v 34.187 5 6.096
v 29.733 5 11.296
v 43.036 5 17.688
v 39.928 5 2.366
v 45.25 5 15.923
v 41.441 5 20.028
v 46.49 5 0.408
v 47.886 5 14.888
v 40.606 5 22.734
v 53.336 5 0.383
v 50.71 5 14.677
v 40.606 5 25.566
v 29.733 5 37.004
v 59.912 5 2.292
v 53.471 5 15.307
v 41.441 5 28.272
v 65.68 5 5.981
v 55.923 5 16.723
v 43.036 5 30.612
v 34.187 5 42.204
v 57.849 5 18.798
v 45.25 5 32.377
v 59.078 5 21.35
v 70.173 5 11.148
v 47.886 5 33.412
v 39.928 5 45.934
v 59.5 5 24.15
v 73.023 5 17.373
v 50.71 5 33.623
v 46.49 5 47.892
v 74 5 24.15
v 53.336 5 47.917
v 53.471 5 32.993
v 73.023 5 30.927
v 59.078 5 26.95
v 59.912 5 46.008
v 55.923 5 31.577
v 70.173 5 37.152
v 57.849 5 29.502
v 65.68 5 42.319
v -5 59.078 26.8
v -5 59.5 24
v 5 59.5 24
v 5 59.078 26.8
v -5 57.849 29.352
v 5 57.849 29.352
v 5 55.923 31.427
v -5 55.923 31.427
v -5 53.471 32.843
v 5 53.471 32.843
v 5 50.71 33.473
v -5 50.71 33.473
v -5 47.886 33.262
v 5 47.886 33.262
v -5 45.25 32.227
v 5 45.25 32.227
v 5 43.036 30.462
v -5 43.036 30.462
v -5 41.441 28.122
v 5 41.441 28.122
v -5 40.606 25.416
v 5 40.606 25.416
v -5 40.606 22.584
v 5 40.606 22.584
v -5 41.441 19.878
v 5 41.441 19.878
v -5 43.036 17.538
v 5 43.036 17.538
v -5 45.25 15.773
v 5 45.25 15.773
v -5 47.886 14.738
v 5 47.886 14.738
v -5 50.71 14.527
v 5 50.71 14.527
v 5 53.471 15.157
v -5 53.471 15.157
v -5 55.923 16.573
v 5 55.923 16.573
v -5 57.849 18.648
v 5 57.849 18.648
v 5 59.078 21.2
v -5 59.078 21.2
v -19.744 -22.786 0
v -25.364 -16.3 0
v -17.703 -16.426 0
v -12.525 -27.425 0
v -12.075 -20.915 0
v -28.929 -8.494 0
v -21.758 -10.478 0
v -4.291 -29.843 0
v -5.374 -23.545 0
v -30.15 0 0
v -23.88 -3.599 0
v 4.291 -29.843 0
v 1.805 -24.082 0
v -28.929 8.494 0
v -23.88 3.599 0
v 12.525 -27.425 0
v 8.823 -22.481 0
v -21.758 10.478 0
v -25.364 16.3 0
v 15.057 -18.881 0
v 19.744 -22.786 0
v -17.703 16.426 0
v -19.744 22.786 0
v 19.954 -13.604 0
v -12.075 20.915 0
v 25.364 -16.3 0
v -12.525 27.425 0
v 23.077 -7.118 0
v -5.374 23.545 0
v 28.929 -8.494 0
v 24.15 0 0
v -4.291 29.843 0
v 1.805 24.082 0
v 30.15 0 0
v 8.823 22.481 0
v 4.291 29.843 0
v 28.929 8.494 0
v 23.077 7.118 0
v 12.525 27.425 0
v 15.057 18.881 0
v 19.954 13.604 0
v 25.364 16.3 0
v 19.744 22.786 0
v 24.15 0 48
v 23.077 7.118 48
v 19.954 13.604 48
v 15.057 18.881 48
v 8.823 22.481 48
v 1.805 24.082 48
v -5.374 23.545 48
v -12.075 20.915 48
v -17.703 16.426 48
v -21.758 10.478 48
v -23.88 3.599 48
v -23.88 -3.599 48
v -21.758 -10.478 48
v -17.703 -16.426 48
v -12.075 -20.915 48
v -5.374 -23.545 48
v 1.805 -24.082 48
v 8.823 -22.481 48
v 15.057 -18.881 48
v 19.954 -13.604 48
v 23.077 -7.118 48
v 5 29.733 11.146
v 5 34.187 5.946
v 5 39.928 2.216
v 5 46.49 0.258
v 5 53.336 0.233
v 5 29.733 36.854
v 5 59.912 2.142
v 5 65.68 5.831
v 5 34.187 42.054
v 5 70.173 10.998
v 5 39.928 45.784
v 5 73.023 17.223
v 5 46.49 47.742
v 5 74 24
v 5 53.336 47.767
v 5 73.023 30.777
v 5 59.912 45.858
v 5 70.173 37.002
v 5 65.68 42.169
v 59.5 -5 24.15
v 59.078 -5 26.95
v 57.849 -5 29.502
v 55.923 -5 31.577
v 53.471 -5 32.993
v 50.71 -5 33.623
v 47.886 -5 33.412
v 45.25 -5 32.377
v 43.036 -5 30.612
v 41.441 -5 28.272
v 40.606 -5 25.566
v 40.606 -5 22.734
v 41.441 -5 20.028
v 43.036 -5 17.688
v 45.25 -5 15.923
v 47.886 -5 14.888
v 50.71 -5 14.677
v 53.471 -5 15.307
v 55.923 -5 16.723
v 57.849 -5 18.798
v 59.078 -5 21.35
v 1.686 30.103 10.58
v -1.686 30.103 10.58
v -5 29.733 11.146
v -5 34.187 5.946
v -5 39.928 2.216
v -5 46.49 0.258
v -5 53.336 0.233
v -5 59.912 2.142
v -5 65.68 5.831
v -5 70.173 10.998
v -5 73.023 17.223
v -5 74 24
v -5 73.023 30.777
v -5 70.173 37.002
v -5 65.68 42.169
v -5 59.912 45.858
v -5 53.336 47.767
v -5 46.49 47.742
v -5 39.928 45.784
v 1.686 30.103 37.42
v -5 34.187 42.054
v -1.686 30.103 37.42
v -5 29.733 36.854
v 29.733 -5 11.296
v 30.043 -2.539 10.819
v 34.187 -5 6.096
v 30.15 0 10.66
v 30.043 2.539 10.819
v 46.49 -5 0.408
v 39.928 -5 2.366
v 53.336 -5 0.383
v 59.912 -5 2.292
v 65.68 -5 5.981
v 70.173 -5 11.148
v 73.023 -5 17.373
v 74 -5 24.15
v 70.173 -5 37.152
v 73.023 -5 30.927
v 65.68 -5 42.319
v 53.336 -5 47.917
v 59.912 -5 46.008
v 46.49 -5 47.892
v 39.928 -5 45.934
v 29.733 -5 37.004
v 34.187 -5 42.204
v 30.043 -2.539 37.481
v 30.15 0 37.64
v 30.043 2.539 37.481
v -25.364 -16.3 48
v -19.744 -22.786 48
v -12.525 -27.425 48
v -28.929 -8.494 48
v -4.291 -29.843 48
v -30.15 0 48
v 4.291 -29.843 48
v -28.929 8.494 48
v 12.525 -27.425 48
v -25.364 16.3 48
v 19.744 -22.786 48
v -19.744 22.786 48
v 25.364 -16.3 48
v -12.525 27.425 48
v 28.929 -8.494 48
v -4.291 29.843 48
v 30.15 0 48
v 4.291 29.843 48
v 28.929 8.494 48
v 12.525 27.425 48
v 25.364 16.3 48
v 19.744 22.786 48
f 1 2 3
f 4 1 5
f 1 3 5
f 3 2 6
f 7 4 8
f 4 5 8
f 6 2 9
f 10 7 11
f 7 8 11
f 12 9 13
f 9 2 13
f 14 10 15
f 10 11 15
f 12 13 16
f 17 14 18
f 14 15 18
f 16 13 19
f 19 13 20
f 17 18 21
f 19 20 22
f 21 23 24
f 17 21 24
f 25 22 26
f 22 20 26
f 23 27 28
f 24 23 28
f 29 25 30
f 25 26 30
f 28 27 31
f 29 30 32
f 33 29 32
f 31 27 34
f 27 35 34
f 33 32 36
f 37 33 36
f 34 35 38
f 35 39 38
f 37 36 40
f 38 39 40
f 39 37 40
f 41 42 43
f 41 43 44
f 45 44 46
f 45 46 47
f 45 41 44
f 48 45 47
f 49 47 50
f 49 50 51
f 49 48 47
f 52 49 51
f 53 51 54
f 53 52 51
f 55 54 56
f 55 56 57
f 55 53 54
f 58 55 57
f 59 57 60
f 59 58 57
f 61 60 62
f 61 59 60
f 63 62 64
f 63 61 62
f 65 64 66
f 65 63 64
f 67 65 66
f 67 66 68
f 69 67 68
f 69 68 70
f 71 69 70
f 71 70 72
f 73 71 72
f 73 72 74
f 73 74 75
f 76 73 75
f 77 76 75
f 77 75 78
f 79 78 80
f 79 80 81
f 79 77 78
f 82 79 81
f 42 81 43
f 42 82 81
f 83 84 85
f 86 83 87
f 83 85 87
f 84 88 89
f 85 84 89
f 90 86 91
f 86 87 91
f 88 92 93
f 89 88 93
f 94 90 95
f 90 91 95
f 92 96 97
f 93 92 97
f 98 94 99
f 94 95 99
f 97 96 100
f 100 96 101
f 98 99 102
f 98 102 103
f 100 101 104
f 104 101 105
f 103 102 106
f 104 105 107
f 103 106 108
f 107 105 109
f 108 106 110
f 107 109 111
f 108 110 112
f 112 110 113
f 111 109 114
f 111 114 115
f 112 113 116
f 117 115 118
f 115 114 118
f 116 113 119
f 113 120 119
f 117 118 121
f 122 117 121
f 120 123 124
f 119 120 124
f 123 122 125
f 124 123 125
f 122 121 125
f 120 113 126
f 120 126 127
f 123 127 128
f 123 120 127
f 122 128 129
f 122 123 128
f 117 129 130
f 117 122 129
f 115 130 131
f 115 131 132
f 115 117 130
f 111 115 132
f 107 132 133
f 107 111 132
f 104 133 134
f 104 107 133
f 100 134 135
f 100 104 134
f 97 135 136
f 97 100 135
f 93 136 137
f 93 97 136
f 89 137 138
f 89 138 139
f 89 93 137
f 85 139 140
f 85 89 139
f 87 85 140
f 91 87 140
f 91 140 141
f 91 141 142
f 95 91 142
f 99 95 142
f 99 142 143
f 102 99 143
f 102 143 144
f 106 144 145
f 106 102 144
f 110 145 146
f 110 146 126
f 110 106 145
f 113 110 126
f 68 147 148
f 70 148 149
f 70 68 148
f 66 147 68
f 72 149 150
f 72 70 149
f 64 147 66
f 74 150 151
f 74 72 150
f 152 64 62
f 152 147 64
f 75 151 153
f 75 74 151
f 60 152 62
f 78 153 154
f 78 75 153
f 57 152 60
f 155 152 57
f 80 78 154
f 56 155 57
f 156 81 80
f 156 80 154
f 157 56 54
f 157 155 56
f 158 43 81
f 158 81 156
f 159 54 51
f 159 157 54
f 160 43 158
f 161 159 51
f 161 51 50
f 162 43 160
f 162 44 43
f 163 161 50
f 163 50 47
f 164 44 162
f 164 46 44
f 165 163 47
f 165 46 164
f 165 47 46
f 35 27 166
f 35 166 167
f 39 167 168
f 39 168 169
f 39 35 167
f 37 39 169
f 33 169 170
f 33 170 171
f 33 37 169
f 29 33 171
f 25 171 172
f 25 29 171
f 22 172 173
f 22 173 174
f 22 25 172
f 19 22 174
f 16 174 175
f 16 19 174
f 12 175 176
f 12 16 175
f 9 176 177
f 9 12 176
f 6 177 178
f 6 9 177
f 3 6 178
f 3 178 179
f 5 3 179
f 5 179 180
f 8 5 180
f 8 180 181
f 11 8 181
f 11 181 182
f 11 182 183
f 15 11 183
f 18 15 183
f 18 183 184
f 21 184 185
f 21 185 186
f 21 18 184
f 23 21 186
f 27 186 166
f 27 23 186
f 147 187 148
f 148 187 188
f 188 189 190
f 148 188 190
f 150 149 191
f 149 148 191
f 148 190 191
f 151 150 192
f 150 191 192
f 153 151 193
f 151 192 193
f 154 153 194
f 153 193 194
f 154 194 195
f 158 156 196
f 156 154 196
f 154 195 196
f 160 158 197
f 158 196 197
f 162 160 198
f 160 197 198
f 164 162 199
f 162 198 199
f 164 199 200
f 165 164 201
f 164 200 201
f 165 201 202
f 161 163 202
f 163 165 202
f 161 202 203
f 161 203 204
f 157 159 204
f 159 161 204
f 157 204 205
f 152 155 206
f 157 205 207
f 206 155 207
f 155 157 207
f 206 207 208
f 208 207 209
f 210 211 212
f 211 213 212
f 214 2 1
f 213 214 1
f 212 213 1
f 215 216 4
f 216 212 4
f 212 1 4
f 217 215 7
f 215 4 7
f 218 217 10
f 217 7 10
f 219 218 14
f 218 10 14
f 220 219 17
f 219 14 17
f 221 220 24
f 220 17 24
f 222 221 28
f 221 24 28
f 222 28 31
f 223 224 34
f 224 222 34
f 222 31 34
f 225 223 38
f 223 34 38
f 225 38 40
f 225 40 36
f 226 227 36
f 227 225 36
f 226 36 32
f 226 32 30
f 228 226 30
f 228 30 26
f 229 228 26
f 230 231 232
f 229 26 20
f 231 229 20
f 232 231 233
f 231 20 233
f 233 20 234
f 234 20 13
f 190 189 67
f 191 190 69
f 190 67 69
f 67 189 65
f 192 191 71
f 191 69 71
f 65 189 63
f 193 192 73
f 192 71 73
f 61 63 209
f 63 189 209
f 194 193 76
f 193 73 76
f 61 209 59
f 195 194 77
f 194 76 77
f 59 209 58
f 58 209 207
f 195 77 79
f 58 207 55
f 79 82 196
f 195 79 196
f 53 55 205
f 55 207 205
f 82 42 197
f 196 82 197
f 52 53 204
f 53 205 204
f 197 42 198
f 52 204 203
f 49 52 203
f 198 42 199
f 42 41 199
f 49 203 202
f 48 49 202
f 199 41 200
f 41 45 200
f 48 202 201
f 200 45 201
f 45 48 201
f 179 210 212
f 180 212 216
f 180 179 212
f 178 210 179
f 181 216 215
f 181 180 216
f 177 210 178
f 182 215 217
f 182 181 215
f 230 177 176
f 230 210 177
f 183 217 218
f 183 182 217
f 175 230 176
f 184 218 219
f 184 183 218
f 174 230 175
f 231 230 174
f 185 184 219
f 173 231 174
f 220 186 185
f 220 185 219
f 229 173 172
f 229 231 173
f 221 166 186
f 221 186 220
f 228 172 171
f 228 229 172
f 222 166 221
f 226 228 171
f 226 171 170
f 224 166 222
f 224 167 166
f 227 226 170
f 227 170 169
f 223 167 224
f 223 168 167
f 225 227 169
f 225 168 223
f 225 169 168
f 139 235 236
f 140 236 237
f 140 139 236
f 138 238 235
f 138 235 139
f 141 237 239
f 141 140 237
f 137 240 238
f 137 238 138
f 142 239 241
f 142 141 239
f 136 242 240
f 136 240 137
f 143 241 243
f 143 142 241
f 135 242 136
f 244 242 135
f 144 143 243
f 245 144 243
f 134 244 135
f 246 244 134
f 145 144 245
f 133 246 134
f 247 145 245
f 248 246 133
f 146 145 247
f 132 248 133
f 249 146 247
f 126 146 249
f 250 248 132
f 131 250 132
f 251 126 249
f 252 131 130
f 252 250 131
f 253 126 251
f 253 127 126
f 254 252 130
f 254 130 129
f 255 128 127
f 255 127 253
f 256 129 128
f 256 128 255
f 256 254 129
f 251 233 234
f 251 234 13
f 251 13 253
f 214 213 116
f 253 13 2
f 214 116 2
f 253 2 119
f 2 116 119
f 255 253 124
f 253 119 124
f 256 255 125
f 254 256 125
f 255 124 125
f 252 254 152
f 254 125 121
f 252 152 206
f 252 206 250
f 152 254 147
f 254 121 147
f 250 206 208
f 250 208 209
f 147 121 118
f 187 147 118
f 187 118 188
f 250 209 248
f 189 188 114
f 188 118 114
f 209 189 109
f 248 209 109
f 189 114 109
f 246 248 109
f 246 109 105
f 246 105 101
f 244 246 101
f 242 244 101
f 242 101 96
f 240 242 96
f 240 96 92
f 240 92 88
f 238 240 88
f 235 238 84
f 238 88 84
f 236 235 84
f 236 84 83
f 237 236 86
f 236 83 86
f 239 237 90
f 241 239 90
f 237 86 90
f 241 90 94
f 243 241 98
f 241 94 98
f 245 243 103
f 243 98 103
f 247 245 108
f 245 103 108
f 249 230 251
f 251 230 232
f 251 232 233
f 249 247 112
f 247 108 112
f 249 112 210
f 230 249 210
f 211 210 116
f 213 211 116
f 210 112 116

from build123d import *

# Parameters (mm, degrees)
SKETCH_R      = 30.15
SKETCH_R_2    = 24.15
PAD_DEPTH     = 48
SKETCH001_R   = 24
SKETCH001_R_2 = 9.5
PAD001_DEPTH  = 10
SKETCH002_R   = 24
SKETCH002_R_2 = 9.5
PAD002_DEPTH  = 10


with BuildPart() as part:
    # Sketch → Pad (new body)
    with BuildSketch(Plane.XY):
        Circle(SKETCH_R)
        Circle(SKETCH_R_2, mode=Mode.SUBTRACT)
    extrude(amount=PAD_DEPTH)

    # Sketch001 → Pad001 (join)
    with BuildSketch(Plane.XZ.offset(-5)):
        with Locations((50, 24.15)):
            Circle(SKETCH001_R)
        with Locations((50, 24.15)):
            Circle(SKETCH001_R_2, mode=Mode.SUBTRACT)
    extrude(amount=PAD001_DEPTH)

    # Sketch002 → Pad002 (join)
    with BuildSketch(Plane.YZ.offset(-5)):
        with Locations((50, 24)):
            Circle(SKETCH002_R)
        with Locations((50, 24)):
            Circle(SKETCH002_R_2, mode=Mode.SUBTRACT)
    extrude(amount=PAD002_DEPTH)


solid = part.part
